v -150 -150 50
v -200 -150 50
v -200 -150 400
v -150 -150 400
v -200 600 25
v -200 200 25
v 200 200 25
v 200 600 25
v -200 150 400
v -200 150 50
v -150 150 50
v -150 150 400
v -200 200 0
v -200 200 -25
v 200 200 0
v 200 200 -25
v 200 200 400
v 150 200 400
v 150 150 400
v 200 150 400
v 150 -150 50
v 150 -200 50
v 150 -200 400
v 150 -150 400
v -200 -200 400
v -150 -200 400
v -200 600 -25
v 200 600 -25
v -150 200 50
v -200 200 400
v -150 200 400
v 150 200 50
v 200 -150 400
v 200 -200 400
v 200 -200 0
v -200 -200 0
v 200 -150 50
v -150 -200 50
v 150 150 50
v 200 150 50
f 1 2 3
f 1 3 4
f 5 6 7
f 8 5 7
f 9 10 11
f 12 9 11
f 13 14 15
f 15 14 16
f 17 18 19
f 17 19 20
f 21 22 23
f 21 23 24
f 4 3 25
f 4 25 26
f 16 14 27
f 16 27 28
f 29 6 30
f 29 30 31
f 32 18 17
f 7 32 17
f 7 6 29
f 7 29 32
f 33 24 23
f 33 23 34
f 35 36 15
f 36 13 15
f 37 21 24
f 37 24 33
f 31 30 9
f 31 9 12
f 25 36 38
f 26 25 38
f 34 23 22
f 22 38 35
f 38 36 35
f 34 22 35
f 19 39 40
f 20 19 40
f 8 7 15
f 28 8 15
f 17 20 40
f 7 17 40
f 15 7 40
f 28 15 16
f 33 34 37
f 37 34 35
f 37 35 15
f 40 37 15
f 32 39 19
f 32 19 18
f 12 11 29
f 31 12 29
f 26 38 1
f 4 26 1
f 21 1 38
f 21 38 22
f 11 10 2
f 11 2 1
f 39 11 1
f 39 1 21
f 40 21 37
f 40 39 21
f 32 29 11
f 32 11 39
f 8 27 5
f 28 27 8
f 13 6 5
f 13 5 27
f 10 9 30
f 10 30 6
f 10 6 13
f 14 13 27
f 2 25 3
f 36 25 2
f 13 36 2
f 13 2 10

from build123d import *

# Parameters (mm, degrees)
SKETCH_1_W      = 400
SKETCH_1_H      = 400
EXTRUDE_1_DEPTH = 50
SKETCH_2_W      = 50
SKETCH_2_H      = 50
EXTRUDE_2_DEPTH = 400
SKETCH_3_W      = 50
SKETCH_3_H      = 50
EXTRUDE_3_DEPTH = 400
SKETCH_4_W      = 50
SKETCH_4_H      = 50
EXTRUDE_4_DEPTH = 400
SKETCH_5_W      = 50
SKETCH_5_H      = 50
EXTRUDE_5_DEPTH = 400
SKETCH_6_W      = 400
SKETCH_6_H      = 400
EXTRUDE_6_DEPTH = 50
SKETCH_7_W      = 400
SKETCH_7_H      = 50
EXTRUDE_7_DEPTH = 400


with BuildPart() as part:
    # 草图1 → 凸台-拉伸1 (new body)
    with BuildSketch(Plane.XY):
        Rectangle(SKETCH_1_W, SKETCH_1_H)
    extrude(amount=EXTRUDE_1_DEPTH)

    # 草图2 → 凸台-拉伸2 (add)
    with BuildSketch(Plane.XY):
        with Locations((175, 175)):
            Rectangle(SKETCH_2_W, SKETCH_2_H)
    extrude(amount=EXTRUDE_2_DEPTH)

    # 草图3 → 凸台-拉伸3 (add)
    with BuildSketch(Plane.XY):
        with Locations((-175, 175)):
            Rectangle(SKETCH_3_W, SKETCH_3_H)
    extrude(amount=EXTRUDE_3_DEPTH)

    # 草图4 → 凸台-拉伸4 (add)
    with BuildSketch(Plane.XY):
        with Locations((175, -175)):
            Rectangle(SKETCH_4_W, SKETCH_4_H)
    extrude(amount=EXTRUDE_4_DEPTH)

    # 草图5 → 凸台-拉伸5 (add)
    with BuildSketch(Plane.XY):
        with Locations((-175, -175)):
            Rectangle(SKETCH_5_W, SKETCH_5_H)
    extrude(amount=EXTRUDE_5_DEPTH)

    # 草图6 → 凸台-拉伸6 (add)
    with BuildSketch(Plane.XY):
        Rectangle(SKETCH_6_W, SKETCH_6_H)
    extrude(amount=EXTRUDE_6_DEPTH)

    # 草图7 → 凸台-拉伸7 (add)
    with BuildSketch(Plane(origin=(0, 200, 0), x_dir=(1, 0, 0), z_dir=(0, 1, 0))):
        Rectangle(SKETCH_7_W, SKETCH_7_H)
    extrude(amount=EXTRUDE_7_DEPTH)


solid = part.part
